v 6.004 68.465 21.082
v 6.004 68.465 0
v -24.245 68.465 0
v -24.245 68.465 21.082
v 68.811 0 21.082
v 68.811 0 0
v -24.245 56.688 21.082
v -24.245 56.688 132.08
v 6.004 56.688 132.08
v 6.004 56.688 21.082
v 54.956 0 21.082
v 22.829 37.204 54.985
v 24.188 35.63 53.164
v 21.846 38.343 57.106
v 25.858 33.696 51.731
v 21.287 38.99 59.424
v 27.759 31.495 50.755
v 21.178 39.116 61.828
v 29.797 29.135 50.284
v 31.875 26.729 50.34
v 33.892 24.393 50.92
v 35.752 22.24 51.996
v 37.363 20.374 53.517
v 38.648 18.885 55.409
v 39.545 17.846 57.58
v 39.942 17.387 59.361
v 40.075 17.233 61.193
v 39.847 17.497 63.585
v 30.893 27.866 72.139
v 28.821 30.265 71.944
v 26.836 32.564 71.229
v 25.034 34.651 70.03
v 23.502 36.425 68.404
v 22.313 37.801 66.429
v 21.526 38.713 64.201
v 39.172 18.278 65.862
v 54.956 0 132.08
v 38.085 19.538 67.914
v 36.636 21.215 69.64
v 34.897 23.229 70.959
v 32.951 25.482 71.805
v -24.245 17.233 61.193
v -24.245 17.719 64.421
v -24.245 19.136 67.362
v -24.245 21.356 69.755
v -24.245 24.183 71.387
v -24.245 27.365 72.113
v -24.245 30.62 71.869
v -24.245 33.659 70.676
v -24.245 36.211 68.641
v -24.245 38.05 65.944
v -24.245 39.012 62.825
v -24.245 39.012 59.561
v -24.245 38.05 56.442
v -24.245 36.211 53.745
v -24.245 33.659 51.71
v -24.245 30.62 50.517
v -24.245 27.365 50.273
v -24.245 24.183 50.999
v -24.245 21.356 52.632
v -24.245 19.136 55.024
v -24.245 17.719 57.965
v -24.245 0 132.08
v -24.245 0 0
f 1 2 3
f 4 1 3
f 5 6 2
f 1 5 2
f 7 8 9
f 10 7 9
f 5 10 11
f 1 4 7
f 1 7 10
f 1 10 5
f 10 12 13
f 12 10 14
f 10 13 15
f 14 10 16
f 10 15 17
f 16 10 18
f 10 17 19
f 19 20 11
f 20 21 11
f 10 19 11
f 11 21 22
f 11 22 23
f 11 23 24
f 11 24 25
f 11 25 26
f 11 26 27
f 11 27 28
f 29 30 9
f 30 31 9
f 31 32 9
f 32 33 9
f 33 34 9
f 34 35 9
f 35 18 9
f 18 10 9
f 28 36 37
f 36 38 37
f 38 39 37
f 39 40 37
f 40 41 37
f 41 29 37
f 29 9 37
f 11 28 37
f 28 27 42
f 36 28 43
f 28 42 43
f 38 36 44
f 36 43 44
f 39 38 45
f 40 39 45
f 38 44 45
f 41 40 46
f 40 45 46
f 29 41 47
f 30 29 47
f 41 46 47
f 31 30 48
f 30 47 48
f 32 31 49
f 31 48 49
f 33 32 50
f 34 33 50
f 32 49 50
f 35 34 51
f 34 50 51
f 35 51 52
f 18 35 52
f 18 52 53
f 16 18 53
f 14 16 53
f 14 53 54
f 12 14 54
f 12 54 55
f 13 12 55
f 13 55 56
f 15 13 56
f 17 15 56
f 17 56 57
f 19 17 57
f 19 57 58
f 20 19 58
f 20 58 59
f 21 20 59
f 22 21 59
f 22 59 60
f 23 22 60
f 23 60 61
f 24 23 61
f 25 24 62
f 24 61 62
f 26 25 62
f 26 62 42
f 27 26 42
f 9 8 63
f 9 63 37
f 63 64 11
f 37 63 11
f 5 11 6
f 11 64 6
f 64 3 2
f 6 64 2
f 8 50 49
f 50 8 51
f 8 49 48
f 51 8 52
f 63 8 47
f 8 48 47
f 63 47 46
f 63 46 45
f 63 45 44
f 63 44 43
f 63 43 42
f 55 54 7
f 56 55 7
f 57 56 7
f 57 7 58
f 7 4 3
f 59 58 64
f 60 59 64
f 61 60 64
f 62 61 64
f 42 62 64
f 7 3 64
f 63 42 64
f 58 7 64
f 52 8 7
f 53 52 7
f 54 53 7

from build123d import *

# Parameters (mm, degrees)
F1_DEPTH = 132.08
F3_DEPTH = 110.998
F4_R     = 10.950567
F5_DEPTH = 77.47


with BuildPart() as f1:
    # F0 (on Top) → F1 (new body)
    with BuildSketch(Plane.XY):
        Polygon((-24.245454, 68.464547), (-24.245454, 0), (68.81091, 0), (6.003636, 68.464547), align=None)
    extrude(amount=F1_DEPTH)

    # F2 (on face) → F3 (cut)
    with BuildSketch(Plane.XY.offset(132.08)):
        Polygon((-24.245454, 68.464547), (-24.245454, 56.688186), (6.003636, 56.688186), (54.956365, 0), (68.81091, 0), (6.003636, 68.464547), align=None)
    extrude(amount=-F3_DEPTH, mode=Mode.SUBTRACT)

    # F4 (on face) → F5 (cut)
    with BuildSketch(Plane(origin=(-24.245454, 0, 0), x_dir=(0, -1, 0), z_dir=(-1, 0, 0))):
        with Locations((-28.183466, 61.193019)):
            Circle(F4_R)
    extrude(amount=-F5_DEPTH, mode=Mode.SUBTRACT)


solid = f1.part
